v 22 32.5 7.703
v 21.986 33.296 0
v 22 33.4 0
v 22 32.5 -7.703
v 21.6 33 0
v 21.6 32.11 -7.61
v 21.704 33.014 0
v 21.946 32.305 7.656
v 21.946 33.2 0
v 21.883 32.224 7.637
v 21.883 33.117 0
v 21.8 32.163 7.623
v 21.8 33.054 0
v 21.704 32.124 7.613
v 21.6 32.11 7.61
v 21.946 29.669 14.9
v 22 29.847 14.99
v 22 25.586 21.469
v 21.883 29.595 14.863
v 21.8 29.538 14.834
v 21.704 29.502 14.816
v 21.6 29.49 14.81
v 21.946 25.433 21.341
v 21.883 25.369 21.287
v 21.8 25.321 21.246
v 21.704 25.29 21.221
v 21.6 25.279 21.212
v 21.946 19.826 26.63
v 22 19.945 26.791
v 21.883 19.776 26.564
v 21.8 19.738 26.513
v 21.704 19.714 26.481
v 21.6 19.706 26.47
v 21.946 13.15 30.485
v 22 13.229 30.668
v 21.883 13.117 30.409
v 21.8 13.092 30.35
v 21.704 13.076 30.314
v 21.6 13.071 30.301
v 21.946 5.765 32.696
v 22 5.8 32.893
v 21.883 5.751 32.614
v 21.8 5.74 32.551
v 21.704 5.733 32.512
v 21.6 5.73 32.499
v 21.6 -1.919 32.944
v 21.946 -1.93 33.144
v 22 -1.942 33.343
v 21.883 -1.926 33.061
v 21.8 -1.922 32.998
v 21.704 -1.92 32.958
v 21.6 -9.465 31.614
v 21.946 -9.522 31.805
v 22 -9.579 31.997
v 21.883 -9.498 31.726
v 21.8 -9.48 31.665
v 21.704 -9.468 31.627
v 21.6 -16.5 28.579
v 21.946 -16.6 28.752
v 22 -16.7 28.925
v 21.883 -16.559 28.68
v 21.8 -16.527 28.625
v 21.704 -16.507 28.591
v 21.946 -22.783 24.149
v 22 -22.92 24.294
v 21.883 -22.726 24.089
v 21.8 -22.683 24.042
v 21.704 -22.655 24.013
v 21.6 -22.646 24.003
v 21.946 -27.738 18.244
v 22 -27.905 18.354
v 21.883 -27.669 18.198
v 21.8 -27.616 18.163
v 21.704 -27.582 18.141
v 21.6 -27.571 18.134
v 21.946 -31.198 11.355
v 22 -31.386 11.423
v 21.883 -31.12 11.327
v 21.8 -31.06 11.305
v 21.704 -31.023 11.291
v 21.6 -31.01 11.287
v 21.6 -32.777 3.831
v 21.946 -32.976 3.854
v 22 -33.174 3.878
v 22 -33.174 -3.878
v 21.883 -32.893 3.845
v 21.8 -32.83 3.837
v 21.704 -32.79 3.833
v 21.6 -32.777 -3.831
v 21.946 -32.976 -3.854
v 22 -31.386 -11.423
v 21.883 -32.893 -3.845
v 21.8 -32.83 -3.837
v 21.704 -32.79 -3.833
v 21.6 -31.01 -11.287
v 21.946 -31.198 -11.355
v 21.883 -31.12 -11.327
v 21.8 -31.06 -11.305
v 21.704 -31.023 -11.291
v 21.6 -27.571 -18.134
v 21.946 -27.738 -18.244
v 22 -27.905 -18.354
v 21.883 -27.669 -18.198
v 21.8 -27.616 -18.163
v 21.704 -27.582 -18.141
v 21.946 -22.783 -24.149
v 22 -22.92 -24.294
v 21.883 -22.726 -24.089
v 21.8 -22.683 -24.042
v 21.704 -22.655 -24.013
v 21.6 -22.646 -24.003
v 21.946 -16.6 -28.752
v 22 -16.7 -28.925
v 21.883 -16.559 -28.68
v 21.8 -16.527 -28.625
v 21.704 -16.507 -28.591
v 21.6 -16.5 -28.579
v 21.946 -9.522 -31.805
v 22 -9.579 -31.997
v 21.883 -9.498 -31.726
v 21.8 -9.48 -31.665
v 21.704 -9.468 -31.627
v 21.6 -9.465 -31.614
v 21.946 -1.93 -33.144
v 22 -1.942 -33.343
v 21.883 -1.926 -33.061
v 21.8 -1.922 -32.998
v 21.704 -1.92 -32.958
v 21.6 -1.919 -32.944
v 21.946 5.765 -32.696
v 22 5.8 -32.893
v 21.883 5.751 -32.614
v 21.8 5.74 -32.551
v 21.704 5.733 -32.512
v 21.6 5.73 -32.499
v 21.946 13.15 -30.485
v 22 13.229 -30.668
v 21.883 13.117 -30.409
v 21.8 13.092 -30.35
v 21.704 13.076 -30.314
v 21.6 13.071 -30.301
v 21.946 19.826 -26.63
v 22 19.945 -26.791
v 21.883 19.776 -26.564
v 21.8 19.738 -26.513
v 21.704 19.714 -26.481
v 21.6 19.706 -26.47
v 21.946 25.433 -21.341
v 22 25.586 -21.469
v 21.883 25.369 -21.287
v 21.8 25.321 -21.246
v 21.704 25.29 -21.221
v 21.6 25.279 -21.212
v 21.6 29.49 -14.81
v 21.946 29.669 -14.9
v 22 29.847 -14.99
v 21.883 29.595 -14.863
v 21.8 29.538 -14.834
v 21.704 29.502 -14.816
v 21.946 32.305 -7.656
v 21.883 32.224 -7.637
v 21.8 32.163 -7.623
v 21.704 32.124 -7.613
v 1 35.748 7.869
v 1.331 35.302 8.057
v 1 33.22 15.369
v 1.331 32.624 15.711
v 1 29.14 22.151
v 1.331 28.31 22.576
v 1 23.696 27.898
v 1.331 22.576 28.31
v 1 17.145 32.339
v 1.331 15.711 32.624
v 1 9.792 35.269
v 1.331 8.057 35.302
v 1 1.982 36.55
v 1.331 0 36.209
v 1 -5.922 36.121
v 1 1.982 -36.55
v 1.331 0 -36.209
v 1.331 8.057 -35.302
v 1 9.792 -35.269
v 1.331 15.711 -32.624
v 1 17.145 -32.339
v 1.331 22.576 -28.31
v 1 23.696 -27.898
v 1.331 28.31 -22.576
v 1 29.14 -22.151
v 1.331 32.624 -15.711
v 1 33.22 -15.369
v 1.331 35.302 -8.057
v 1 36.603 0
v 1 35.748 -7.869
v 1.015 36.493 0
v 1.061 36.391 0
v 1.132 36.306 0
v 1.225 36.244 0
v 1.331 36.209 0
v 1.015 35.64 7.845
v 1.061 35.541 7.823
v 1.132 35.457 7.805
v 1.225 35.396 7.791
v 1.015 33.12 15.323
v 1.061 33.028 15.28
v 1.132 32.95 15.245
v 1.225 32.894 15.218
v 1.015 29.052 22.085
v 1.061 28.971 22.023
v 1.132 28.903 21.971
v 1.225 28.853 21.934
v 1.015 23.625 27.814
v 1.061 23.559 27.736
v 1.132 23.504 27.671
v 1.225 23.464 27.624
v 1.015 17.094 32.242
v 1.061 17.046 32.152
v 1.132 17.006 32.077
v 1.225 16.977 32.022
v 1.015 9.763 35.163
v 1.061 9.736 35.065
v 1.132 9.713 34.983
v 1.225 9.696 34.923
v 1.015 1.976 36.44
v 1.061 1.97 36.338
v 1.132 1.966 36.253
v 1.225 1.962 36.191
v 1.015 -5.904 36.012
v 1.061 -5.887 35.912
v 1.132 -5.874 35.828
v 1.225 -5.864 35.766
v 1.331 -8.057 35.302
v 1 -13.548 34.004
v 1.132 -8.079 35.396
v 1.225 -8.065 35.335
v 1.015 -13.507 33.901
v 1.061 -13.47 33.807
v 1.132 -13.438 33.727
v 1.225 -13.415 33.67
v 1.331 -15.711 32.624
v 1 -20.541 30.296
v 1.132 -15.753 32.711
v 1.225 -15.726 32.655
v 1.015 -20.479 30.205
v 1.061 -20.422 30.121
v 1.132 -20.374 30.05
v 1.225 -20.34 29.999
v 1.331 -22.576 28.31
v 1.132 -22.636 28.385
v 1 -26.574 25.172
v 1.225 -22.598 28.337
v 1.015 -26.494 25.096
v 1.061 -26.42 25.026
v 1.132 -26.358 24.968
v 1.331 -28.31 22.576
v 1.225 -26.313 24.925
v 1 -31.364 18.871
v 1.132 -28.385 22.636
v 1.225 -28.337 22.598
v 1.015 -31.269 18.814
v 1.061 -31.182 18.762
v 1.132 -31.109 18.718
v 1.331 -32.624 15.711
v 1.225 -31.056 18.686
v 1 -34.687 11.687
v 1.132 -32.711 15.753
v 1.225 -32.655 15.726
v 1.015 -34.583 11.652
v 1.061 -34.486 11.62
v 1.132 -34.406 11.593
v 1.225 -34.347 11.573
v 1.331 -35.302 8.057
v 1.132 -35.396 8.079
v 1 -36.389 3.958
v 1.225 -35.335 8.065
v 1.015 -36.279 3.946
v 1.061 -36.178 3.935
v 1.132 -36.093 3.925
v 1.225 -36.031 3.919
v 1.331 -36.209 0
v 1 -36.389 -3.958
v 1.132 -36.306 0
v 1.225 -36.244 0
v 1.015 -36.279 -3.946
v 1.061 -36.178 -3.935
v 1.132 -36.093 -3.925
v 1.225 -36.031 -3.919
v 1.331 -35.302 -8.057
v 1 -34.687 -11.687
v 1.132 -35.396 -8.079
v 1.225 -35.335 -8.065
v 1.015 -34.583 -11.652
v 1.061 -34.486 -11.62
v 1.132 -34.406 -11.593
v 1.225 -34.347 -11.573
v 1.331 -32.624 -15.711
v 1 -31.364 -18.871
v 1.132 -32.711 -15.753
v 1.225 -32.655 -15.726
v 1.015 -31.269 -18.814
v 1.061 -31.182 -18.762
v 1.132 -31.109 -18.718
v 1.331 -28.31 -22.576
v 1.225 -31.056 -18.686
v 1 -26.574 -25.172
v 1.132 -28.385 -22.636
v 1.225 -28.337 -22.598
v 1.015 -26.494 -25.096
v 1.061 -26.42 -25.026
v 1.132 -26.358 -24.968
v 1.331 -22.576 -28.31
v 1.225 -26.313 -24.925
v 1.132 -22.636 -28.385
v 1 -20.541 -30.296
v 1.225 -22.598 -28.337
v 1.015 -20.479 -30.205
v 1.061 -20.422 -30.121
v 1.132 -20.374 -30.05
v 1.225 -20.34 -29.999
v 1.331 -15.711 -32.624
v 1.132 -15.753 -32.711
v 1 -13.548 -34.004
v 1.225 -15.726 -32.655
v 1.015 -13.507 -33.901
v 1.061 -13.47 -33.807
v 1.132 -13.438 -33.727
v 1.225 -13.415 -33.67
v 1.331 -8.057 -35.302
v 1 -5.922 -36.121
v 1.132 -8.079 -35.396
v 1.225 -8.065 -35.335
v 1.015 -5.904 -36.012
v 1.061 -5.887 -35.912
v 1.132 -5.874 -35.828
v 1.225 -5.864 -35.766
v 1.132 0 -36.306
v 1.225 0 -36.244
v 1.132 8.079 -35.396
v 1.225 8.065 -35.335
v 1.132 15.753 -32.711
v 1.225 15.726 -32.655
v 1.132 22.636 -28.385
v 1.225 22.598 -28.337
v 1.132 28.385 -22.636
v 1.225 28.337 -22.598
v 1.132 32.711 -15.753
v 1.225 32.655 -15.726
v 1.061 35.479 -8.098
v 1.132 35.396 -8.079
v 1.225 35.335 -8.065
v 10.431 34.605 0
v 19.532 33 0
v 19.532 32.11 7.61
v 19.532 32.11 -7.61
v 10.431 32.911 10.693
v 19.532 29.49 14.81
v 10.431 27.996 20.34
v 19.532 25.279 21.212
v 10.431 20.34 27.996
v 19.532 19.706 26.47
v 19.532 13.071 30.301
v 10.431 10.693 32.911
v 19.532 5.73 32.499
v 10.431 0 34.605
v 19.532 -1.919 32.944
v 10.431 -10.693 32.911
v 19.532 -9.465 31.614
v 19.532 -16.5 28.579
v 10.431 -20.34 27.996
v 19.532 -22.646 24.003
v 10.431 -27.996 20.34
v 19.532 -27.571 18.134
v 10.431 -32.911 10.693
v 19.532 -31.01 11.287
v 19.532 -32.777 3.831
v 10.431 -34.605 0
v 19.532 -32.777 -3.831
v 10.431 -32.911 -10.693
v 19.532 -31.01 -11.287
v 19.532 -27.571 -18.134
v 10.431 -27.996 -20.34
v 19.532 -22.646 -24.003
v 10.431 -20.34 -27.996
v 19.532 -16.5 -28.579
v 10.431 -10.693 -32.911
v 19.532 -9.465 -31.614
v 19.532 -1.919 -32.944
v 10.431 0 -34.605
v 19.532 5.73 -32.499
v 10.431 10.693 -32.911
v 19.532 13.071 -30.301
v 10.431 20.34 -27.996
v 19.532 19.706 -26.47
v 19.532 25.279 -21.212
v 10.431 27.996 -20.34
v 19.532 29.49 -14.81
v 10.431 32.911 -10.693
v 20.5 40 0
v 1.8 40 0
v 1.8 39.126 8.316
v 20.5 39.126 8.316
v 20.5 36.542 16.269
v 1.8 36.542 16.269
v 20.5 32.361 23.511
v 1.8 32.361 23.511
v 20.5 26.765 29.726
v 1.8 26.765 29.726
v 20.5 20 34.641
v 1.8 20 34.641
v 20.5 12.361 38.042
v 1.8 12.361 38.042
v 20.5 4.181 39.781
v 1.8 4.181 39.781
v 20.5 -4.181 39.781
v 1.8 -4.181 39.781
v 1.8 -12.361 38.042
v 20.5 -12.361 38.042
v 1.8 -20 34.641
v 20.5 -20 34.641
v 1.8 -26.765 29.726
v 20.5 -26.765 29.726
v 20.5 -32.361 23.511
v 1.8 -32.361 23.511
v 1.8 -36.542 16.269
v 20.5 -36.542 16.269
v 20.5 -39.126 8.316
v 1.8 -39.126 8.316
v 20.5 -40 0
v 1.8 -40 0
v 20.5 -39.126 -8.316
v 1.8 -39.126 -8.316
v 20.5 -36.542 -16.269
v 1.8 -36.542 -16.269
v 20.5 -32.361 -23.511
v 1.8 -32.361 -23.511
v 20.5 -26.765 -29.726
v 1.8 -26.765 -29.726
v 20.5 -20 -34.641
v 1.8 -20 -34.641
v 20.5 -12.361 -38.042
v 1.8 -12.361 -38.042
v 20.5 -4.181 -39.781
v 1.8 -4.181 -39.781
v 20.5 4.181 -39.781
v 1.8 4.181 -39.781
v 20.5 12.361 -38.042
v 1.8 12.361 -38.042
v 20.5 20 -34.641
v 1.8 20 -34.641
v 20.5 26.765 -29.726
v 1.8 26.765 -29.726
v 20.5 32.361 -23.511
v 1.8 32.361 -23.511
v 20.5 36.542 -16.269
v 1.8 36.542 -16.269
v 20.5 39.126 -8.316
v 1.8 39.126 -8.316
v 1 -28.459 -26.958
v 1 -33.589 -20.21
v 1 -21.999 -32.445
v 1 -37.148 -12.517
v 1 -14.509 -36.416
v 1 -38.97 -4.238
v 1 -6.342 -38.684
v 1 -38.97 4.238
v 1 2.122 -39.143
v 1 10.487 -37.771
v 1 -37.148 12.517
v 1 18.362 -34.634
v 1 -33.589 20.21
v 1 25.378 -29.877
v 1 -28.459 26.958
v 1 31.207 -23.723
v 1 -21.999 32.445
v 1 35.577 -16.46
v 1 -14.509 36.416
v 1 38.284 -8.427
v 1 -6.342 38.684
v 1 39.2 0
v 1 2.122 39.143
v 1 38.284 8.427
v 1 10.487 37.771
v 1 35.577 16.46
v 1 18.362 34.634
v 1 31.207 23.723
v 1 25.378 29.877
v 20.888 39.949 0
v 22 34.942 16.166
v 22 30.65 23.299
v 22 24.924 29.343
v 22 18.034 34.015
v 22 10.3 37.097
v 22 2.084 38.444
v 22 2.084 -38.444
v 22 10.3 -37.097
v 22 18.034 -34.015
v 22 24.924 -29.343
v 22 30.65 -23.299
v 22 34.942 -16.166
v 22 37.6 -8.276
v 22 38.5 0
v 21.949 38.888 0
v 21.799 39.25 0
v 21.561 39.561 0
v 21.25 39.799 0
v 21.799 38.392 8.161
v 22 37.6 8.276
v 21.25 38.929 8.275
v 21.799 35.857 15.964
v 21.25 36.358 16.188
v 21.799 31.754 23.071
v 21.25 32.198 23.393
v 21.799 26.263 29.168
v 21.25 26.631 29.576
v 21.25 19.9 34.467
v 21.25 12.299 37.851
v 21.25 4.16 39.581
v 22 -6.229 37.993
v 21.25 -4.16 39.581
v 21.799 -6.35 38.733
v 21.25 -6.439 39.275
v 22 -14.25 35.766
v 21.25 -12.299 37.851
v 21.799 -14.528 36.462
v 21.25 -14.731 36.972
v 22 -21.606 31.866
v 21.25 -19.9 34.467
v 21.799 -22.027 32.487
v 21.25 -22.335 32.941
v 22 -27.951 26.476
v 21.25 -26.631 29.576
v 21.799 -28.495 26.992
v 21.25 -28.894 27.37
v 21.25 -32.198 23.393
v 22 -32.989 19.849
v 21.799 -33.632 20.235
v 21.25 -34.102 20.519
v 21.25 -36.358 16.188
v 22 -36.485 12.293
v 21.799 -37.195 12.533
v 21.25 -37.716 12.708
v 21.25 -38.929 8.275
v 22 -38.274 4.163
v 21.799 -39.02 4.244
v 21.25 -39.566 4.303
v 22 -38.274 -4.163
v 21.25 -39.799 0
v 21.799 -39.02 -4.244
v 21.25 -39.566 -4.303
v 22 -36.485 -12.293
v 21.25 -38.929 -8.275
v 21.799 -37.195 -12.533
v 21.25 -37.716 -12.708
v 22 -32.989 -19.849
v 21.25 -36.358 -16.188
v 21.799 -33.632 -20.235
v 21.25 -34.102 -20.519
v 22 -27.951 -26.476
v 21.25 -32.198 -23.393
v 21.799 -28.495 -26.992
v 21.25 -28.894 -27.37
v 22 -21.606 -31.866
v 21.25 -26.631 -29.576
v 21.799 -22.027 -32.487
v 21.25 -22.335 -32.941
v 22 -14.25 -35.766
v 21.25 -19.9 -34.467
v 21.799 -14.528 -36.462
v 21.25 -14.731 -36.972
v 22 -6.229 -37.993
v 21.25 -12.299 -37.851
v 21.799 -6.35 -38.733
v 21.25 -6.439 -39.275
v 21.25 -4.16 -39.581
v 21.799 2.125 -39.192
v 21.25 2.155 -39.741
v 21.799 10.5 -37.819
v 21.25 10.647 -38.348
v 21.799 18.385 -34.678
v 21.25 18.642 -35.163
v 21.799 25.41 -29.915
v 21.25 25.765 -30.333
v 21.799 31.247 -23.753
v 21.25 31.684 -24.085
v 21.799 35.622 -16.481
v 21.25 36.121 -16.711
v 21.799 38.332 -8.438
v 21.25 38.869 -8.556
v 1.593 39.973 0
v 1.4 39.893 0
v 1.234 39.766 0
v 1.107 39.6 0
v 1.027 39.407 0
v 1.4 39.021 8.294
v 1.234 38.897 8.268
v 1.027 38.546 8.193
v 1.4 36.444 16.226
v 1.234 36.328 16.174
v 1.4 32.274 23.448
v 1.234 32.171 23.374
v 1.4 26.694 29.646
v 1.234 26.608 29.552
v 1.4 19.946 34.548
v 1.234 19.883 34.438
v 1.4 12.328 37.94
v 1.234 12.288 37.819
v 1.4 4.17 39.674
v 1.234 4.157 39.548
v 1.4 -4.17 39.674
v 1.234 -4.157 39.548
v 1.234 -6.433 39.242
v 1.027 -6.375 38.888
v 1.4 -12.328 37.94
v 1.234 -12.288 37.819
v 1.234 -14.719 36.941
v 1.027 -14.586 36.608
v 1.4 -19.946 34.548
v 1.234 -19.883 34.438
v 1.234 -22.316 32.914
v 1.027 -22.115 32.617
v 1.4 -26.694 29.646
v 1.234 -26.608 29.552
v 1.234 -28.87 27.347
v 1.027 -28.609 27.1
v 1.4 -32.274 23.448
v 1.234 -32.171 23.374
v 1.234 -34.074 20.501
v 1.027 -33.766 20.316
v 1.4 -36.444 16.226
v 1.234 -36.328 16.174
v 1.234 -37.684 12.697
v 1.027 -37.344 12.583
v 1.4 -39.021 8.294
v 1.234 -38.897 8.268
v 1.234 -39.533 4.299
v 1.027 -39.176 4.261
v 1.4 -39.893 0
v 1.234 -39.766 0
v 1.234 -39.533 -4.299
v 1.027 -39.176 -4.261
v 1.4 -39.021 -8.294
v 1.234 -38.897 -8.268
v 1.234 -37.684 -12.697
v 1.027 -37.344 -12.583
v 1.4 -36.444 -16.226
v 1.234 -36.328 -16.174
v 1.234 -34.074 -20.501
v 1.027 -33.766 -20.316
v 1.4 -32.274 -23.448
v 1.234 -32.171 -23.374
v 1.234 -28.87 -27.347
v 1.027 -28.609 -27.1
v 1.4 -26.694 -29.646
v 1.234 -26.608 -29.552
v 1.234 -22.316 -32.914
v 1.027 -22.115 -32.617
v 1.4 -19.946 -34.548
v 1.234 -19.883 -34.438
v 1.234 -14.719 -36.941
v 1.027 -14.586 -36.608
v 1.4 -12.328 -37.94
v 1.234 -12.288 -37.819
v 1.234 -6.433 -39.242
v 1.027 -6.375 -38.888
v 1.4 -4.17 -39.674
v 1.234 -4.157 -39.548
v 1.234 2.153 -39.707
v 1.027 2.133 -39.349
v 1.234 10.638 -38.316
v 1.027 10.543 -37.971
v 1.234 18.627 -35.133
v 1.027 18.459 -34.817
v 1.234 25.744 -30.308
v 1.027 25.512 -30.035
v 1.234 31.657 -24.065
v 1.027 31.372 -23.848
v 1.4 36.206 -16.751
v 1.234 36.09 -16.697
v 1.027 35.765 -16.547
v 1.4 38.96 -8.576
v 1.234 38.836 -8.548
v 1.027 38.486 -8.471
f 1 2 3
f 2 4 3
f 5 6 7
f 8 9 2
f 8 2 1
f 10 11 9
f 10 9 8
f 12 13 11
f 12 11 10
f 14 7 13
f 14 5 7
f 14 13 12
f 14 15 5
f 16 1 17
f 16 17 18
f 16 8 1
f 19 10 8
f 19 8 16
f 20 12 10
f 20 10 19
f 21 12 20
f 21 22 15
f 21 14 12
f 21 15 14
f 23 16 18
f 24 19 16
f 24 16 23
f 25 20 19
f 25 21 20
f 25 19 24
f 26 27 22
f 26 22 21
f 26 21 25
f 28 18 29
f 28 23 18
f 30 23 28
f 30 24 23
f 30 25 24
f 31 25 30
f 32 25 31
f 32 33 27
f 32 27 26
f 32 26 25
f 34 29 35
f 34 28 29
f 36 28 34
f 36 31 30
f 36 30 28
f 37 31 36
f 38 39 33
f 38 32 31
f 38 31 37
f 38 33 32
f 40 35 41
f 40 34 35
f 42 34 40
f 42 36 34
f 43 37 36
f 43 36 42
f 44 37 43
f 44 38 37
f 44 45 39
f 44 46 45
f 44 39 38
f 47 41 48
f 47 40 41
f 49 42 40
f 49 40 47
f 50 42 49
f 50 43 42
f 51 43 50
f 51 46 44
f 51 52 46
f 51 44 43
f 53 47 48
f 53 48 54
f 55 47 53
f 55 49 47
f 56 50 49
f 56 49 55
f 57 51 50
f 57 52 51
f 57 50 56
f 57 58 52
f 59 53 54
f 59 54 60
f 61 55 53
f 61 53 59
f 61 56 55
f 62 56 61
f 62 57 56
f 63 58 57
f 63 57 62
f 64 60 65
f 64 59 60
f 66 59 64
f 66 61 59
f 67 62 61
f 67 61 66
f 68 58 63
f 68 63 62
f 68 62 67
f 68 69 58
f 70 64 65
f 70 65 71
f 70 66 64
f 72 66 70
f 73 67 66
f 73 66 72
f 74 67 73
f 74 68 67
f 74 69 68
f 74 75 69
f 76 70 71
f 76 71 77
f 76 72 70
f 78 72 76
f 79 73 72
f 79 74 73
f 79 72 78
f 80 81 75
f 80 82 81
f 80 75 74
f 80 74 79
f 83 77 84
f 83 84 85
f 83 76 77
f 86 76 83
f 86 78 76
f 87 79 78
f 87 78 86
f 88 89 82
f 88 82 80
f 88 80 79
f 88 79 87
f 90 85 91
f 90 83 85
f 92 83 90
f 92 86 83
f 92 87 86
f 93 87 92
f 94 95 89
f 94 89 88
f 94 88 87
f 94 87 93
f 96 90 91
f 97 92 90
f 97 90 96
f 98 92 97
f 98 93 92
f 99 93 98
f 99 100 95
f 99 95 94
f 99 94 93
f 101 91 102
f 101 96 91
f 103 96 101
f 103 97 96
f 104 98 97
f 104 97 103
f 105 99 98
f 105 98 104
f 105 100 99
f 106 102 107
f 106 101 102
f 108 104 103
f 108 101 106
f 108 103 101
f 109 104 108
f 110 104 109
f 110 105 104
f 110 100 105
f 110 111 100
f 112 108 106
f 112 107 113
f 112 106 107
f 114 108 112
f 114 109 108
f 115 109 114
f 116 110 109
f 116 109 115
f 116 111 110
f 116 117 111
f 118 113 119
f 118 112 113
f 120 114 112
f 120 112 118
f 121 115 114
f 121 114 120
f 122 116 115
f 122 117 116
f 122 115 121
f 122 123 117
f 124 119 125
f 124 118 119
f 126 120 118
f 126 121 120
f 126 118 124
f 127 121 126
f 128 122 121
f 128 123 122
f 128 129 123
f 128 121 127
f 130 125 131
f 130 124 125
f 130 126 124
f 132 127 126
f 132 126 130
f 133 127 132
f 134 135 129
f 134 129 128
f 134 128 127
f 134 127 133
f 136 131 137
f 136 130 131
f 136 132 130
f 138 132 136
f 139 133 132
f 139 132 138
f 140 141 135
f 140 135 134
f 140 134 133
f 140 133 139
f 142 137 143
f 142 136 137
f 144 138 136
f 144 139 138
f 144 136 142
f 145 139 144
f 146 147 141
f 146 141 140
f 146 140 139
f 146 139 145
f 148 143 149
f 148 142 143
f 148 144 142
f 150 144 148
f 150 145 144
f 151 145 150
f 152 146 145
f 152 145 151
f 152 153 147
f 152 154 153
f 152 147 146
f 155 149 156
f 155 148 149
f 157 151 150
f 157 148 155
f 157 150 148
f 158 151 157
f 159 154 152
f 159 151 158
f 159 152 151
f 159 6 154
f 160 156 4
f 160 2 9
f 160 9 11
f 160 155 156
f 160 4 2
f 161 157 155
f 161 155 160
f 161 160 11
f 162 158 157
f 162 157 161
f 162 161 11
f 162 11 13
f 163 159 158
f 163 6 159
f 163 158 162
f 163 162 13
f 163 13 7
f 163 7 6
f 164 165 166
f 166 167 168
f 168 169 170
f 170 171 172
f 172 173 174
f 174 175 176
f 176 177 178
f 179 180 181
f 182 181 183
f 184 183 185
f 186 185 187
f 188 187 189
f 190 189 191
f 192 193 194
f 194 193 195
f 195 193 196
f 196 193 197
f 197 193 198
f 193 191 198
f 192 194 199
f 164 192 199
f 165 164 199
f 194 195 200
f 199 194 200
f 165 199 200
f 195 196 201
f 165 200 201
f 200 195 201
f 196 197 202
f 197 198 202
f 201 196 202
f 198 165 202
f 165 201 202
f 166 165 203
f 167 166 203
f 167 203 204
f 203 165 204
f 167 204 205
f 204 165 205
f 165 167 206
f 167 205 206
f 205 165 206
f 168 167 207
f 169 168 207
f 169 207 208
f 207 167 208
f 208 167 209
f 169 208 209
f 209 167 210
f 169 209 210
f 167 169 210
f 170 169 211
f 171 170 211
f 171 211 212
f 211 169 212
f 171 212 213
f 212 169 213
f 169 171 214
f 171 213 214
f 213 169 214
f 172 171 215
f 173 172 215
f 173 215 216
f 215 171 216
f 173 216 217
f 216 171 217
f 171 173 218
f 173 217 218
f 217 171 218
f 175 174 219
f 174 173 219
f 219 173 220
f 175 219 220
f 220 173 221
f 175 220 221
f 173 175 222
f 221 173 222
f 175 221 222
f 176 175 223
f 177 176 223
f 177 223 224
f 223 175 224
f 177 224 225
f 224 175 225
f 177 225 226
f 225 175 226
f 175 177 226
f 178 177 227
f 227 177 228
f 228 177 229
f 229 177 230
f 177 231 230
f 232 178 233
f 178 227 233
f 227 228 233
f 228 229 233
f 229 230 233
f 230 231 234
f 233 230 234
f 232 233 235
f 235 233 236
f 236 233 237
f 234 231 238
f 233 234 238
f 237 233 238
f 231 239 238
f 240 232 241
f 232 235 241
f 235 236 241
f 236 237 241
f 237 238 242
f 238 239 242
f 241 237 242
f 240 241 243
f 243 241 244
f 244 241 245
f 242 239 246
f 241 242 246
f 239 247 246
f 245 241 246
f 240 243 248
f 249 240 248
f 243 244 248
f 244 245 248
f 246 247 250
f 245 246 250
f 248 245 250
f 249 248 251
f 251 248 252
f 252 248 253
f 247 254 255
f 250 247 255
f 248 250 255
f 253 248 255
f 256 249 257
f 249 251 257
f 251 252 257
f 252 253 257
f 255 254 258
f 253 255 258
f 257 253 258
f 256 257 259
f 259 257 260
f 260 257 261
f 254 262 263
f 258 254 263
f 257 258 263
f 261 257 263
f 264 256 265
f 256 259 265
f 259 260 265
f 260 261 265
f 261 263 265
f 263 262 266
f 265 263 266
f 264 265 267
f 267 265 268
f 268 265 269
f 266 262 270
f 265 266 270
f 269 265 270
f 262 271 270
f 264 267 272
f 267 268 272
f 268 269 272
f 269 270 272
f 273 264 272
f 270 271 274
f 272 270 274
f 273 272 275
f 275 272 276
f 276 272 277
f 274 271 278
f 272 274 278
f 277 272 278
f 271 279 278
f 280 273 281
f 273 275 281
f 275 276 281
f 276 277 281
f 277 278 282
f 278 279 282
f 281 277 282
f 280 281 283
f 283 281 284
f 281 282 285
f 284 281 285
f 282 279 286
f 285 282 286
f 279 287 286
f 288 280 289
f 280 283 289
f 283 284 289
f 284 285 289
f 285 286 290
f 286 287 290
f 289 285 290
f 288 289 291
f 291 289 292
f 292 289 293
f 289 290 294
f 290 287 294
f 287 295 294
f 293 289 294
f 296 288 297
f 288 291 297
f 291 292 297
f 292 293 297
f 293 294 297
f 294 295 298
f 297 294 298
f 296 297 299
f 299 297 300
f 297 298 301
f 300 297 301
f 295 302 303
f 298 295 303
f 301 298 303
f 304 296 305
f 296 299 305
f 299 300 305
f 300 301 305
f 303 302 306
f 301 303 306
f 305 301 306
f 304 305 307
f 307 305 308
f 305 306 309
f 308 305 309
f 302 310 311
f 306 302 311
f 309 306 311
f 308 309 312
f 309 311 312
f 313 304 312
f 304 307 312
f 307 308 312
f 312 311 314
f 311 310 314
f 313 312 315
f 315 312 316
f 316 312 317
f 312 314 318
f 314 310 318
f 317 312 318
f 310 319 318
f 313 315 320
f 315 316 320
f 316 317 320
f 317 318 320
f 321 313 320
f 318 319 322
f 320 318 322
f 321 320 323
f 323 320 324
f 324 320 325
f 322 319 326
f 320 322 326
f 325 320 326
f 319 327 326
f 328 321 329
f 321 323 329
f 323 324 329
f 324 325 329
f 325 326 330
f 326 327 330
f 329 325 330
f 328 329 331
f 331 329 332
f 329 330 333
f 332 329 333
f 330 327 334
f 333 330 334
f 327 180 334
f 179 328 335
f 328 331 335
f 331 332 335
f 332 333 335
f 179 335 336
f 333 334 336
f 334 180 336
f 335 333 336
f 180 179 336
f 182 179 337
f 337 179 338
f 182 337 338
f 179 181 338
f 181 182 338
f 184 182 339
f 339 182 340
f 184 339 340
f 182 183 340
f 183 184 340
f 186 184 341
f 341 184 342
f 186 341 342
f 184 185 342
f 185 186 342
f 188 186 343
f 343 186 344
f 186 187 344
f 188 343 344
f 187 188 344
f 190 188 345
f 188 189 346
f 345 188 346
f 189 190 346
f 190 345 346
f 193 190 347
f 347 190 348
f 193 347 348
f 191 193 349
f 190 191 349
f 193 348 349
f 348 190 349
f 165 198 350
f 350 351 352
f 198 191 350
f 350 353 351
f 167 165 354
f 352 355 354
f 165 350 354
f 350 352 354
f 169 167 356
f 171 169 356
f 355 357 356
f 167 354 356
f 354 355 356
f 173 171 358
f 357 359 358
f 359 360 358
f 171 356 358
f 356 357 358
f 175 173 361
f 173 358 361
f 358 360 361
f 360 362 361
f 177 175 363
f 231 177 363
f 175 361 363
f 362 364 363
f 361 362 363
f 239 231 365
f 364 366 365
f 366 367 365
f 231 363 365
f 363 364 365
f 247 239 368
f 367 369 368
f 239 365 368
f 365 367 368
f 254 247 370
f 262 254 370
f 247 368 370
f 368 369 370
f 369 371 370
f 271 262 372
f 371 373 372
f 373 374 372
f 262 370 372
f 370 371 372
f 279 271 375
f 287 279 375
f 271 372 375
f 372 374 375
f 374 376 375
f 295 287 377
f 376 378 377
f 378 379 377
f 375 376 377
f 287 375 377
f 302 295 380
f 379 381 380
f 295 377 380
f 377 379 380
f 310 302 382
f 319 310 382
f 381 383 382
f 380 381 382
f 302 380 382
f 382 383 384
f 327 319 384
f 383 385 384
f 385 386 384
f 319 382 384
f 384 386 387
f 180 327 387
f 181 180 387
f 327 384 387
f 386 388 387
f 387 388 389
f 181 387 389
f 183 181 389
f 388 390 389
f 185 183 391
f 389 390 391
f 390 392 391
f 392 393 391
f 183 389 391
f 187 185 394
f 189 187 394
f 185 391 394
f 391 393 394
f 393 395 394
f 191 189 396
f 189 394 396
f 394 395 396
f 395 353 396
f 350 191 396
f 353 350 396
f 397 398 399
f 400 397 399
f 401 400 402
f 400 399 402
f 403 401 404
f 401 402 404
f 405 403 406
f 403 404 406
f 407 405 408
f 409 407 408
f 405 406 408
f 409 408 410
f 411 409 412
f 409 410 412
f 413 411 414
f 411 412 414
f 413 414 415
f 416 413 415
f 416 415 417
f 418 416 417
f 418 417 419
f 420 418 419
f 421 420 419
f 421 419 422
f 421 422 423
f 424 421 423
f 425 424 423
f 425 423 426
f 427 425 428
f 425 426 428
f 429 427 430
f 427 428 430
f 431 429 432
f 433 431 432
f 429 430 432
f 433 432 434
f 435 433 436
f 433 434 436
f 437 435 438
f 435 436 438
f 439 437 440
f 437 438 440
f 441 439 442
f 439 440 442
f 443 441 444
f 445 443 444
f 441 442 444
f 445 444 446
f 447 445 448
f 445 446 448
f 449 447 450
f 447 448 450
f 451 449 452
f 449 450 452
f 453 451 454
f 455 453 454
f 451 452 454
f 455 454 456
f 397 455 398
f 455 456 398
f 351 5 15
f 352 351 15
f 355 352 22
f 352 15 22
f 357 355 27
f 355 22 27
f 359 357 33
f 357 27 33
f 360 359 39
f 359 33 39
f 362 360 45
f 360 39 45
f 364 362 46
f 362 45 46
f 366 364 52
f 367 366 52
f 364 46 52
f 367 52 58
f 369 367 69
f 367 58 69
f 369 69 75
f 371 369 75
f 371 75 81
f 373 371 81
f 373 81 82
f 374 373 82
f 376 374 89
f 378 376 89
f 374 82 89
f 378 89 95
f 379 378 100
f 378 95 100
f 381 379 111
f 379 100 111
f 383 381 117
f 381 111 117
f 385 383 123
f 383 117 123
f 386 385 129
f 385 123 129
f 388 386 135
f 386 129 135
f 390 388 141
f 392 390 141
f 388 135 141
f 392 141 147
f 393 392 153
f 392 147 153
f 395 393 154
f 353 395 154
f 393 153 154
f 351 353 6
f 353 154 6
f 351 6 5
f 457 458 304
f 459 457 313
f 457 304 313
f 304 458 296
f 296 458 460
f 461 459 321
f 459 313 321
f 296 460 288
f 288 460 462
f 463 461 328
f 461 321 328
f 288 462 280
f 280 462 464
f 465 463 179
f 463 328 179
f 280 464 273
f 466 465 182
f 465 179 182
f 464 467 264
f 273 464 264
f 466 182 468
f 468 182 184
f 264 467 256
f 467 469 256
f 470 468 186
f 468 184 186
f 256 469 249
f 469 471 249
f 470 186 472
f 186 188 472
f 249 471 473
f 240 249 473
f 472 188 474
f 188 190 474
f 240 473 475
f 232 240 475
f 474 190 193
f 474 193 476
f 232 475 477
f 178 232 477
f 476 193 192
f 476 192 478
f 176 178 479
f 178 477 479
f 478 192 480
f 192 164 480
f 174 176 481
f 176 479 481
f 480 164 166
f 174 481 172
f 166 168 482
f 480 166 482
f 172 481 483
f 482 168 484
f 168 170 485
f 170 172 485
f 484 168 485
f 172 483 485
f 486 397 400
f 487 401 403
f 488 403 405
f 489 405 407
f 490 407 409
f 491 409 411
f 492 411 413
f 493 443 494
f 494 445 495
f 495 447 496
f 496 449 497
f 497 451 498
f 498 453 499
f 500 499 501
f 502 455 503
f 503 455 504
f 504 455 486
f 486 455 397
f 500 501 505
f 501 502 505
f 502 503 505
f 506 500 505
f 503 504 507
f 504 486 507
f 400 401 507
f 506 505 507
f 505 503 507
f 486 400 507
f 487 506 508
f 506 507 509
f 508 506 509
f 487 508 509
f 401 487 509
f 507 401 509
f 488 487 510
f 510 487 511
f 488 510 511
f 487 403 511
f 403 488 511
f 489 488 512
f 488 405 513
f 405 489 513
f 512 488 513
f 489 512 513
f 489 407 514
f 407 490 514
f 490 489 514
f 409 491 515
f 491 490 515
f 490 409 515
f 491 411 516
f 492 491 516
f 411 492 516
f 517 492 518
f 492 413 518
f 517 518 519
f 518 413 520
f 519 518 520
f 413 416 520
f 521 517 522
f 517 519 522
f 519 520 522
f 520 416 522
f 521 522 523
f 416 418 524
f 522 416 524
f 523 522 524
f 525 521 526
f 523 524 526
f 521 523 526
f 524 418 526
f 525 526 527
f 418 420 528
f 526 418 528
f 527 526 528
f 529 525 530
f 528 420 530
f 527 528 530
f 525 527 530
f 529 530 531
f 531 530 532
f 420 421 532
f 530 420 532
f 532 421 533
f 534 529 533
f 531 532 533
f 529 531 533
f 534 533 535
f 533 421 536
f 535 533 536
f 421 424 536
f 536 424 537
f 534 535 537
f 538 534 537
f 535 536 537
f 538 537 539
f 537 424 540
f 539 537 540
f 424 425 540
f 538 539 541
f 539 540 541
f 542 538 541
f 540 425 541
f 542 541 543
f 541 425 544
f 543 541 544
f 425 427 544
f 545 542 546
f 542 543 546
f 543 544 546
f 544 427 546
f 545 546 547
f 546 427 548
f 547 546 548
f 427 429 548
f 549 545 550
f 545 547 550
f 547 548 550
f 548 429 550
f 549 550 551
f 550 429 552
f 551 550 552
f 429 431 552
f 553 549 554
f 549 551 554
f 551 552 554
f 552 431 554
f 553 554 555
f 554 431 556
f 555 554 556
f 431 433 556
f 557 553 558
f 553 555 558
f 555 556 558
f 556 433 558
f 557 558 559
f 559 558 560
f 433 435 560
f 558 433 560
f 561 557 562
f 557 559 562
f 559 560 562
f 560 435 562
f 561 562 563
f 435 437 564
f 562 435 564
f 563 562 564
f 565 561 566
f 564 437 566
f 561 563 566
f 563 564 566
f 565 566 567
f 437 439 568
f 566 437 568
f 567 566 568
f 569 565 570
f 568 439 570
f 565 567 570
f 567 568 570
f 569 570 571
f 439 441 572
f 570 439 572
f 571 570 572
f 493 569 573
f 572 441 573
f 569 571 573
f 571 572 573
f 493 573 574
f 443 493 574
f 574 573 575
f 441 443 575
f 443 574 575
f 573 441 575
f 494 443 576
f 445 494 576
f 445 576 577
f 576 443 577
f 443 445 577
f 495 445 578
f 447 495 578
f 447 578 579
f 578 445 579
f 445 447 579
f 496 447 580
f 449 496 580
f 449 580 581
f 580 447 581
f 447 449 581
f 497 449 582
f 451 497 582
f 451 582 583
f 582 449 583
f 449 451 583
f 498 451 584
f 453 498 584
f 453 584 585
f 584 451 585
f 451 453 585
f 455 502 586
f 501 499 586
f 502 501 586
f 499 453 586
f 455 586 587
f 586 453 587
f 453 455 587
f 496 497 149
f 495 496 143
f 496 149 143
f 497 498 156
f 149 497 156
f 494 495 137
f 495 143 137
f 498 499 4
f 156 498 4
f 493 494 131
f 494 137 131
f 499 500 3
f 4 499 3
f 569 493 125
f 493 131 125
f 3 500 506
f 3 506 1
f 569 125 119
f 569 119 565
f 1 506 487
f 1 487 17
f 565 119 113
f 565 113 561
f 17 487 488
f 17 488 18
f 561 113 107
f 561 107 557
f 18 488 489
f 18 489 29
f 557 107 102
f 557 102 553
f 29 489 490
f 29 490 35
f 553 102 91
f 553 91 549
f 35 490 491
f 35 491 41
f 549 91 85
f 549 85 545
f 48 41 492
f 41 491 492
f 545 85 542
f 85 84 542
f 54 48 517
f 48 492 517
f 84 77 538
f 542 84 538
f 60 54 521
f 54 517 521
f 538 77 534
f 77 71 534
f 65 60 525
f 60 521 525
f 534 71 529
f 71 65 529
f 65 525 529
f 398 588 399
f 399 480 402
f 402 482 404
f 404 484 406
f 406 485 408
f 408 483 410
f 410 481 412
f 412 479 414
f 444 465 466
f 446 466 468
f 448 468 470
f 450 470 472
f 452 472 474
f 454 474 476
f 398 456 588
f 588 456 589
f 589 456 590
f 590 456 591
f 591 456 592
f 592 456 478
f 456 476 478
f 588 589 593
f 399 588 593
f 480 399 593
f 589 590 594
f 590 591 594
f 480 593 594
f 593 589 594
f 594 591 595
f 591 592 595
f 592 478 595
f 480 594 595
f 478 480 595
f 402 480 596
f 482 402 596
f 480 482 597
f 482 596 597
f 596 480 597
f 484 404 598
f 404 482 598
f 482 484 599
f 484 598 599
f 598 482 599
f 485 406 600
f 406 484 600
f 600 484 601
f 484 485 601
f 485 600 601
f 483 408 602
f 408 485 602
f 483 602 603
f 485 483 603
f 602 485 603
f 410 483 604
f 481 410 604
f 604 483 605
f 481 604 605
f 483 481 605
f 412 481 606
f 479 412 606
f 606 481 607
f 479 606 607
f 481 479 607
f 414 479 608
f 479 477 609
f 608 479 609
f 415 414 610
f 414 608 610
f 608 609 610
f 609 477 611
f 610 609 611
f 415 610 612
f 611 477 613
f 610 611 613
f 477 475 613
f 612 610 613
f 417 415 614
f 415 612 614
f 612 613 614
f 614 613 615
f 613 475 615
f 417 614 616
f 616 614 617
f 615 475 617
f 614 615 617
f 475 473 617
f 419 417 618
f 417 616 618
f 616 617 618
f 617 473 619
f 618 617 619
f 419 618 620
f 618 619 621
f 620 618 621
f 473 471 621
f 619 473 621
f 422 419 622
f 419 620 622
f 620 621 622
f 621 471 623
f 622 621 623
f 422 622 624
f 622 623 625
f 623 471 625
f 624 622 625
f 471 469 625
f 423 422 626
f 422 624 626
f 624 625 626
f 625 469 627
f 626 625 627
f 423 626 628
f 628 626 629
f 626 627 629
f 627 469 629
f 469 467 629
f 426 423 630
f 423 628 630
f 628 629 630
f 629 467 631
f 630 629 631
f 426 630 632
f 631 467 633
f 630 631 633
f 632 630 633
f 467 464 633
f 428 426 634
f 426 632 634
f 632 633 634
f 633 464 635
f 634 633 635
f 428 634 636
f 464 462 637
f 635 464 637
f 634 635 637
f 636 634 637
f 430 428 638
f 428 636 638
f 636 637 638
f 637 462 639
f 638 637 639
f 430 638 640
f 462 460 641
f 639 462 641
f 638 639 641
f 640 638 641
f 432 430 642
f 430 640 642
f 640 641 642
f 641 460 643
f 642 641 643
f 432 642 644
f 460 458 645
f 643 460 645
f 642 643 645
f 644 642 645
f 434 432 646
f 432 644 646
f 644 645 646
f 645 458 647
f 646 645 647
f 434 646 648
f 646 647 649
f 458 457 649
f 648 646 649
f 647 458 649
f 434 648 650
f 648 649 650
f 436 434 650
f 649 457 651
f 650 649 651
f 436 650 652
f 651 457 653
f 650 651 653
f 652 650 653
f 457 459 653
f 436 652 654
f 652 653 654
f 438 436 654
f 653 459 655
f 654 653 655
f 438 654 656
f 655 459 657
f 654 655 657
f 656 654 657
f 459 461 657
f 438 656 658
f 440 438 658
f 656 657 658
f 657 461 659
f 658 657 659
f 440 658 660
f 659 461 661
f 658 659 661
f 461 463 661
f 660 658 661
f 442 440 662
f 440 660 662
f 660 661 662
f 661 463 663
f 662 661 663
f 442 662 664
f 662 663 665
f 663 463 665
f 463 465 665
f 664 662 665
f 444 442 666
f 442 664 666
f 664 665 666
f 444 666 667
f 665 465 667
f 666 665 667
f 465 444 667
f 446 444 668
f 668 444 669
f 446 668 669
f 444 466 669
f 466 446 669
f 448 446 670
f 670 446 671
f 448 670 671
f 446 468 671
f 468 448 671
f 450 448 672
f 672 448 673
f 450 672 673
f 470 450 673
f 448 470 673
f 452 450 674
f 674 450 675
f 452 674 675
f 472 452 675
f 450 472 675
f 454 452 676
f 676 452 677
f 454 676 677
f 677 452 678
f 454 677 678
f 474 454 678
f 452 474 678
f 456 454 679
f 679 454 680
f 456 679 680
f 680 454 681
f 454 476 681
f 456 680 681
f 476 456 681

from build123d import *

# Parameters (mm, degrees)
FILLET1_R = 1.5
FILLET2_R = 0.8
FILLET3_R = 0.4


with BuildPart() as part:
    # Sketch1 → Revolve1 (revolve)
    with BuildSketch(Plane.XY):
        Polygon((22, 33), (22, 40), (1, 40), (1, 36.267672581), (19.5318921, 33), align=None)
    revolve(axis=Axis((0, 0, 0), (1, 0, 0)))

    # Fillet1
    fillet1_edges = [part.edges().sort_by_distance(p)[0] for p in [
        (22, -40, 0),
    ]]
    fillet(fillet1_edges, radius=FILLET1_R)

    # Fillet2
    fillet2_edges = [part.edges().sort_by_distance(p)[0] for p in [
        (1, -40, 0),
    ]]
    fillet(fillet2_edges, radius=FILLET2_R)

    # Fillet3
    fillet3_edges = [part.edges().sort_by_distance(p)[0] for p in [
        (22, -33, 0),
        (1, -36.267672581, 0),
    ]]
    fillet(fillet3_edges, radius=FILLET3_R)


solid = part.part
